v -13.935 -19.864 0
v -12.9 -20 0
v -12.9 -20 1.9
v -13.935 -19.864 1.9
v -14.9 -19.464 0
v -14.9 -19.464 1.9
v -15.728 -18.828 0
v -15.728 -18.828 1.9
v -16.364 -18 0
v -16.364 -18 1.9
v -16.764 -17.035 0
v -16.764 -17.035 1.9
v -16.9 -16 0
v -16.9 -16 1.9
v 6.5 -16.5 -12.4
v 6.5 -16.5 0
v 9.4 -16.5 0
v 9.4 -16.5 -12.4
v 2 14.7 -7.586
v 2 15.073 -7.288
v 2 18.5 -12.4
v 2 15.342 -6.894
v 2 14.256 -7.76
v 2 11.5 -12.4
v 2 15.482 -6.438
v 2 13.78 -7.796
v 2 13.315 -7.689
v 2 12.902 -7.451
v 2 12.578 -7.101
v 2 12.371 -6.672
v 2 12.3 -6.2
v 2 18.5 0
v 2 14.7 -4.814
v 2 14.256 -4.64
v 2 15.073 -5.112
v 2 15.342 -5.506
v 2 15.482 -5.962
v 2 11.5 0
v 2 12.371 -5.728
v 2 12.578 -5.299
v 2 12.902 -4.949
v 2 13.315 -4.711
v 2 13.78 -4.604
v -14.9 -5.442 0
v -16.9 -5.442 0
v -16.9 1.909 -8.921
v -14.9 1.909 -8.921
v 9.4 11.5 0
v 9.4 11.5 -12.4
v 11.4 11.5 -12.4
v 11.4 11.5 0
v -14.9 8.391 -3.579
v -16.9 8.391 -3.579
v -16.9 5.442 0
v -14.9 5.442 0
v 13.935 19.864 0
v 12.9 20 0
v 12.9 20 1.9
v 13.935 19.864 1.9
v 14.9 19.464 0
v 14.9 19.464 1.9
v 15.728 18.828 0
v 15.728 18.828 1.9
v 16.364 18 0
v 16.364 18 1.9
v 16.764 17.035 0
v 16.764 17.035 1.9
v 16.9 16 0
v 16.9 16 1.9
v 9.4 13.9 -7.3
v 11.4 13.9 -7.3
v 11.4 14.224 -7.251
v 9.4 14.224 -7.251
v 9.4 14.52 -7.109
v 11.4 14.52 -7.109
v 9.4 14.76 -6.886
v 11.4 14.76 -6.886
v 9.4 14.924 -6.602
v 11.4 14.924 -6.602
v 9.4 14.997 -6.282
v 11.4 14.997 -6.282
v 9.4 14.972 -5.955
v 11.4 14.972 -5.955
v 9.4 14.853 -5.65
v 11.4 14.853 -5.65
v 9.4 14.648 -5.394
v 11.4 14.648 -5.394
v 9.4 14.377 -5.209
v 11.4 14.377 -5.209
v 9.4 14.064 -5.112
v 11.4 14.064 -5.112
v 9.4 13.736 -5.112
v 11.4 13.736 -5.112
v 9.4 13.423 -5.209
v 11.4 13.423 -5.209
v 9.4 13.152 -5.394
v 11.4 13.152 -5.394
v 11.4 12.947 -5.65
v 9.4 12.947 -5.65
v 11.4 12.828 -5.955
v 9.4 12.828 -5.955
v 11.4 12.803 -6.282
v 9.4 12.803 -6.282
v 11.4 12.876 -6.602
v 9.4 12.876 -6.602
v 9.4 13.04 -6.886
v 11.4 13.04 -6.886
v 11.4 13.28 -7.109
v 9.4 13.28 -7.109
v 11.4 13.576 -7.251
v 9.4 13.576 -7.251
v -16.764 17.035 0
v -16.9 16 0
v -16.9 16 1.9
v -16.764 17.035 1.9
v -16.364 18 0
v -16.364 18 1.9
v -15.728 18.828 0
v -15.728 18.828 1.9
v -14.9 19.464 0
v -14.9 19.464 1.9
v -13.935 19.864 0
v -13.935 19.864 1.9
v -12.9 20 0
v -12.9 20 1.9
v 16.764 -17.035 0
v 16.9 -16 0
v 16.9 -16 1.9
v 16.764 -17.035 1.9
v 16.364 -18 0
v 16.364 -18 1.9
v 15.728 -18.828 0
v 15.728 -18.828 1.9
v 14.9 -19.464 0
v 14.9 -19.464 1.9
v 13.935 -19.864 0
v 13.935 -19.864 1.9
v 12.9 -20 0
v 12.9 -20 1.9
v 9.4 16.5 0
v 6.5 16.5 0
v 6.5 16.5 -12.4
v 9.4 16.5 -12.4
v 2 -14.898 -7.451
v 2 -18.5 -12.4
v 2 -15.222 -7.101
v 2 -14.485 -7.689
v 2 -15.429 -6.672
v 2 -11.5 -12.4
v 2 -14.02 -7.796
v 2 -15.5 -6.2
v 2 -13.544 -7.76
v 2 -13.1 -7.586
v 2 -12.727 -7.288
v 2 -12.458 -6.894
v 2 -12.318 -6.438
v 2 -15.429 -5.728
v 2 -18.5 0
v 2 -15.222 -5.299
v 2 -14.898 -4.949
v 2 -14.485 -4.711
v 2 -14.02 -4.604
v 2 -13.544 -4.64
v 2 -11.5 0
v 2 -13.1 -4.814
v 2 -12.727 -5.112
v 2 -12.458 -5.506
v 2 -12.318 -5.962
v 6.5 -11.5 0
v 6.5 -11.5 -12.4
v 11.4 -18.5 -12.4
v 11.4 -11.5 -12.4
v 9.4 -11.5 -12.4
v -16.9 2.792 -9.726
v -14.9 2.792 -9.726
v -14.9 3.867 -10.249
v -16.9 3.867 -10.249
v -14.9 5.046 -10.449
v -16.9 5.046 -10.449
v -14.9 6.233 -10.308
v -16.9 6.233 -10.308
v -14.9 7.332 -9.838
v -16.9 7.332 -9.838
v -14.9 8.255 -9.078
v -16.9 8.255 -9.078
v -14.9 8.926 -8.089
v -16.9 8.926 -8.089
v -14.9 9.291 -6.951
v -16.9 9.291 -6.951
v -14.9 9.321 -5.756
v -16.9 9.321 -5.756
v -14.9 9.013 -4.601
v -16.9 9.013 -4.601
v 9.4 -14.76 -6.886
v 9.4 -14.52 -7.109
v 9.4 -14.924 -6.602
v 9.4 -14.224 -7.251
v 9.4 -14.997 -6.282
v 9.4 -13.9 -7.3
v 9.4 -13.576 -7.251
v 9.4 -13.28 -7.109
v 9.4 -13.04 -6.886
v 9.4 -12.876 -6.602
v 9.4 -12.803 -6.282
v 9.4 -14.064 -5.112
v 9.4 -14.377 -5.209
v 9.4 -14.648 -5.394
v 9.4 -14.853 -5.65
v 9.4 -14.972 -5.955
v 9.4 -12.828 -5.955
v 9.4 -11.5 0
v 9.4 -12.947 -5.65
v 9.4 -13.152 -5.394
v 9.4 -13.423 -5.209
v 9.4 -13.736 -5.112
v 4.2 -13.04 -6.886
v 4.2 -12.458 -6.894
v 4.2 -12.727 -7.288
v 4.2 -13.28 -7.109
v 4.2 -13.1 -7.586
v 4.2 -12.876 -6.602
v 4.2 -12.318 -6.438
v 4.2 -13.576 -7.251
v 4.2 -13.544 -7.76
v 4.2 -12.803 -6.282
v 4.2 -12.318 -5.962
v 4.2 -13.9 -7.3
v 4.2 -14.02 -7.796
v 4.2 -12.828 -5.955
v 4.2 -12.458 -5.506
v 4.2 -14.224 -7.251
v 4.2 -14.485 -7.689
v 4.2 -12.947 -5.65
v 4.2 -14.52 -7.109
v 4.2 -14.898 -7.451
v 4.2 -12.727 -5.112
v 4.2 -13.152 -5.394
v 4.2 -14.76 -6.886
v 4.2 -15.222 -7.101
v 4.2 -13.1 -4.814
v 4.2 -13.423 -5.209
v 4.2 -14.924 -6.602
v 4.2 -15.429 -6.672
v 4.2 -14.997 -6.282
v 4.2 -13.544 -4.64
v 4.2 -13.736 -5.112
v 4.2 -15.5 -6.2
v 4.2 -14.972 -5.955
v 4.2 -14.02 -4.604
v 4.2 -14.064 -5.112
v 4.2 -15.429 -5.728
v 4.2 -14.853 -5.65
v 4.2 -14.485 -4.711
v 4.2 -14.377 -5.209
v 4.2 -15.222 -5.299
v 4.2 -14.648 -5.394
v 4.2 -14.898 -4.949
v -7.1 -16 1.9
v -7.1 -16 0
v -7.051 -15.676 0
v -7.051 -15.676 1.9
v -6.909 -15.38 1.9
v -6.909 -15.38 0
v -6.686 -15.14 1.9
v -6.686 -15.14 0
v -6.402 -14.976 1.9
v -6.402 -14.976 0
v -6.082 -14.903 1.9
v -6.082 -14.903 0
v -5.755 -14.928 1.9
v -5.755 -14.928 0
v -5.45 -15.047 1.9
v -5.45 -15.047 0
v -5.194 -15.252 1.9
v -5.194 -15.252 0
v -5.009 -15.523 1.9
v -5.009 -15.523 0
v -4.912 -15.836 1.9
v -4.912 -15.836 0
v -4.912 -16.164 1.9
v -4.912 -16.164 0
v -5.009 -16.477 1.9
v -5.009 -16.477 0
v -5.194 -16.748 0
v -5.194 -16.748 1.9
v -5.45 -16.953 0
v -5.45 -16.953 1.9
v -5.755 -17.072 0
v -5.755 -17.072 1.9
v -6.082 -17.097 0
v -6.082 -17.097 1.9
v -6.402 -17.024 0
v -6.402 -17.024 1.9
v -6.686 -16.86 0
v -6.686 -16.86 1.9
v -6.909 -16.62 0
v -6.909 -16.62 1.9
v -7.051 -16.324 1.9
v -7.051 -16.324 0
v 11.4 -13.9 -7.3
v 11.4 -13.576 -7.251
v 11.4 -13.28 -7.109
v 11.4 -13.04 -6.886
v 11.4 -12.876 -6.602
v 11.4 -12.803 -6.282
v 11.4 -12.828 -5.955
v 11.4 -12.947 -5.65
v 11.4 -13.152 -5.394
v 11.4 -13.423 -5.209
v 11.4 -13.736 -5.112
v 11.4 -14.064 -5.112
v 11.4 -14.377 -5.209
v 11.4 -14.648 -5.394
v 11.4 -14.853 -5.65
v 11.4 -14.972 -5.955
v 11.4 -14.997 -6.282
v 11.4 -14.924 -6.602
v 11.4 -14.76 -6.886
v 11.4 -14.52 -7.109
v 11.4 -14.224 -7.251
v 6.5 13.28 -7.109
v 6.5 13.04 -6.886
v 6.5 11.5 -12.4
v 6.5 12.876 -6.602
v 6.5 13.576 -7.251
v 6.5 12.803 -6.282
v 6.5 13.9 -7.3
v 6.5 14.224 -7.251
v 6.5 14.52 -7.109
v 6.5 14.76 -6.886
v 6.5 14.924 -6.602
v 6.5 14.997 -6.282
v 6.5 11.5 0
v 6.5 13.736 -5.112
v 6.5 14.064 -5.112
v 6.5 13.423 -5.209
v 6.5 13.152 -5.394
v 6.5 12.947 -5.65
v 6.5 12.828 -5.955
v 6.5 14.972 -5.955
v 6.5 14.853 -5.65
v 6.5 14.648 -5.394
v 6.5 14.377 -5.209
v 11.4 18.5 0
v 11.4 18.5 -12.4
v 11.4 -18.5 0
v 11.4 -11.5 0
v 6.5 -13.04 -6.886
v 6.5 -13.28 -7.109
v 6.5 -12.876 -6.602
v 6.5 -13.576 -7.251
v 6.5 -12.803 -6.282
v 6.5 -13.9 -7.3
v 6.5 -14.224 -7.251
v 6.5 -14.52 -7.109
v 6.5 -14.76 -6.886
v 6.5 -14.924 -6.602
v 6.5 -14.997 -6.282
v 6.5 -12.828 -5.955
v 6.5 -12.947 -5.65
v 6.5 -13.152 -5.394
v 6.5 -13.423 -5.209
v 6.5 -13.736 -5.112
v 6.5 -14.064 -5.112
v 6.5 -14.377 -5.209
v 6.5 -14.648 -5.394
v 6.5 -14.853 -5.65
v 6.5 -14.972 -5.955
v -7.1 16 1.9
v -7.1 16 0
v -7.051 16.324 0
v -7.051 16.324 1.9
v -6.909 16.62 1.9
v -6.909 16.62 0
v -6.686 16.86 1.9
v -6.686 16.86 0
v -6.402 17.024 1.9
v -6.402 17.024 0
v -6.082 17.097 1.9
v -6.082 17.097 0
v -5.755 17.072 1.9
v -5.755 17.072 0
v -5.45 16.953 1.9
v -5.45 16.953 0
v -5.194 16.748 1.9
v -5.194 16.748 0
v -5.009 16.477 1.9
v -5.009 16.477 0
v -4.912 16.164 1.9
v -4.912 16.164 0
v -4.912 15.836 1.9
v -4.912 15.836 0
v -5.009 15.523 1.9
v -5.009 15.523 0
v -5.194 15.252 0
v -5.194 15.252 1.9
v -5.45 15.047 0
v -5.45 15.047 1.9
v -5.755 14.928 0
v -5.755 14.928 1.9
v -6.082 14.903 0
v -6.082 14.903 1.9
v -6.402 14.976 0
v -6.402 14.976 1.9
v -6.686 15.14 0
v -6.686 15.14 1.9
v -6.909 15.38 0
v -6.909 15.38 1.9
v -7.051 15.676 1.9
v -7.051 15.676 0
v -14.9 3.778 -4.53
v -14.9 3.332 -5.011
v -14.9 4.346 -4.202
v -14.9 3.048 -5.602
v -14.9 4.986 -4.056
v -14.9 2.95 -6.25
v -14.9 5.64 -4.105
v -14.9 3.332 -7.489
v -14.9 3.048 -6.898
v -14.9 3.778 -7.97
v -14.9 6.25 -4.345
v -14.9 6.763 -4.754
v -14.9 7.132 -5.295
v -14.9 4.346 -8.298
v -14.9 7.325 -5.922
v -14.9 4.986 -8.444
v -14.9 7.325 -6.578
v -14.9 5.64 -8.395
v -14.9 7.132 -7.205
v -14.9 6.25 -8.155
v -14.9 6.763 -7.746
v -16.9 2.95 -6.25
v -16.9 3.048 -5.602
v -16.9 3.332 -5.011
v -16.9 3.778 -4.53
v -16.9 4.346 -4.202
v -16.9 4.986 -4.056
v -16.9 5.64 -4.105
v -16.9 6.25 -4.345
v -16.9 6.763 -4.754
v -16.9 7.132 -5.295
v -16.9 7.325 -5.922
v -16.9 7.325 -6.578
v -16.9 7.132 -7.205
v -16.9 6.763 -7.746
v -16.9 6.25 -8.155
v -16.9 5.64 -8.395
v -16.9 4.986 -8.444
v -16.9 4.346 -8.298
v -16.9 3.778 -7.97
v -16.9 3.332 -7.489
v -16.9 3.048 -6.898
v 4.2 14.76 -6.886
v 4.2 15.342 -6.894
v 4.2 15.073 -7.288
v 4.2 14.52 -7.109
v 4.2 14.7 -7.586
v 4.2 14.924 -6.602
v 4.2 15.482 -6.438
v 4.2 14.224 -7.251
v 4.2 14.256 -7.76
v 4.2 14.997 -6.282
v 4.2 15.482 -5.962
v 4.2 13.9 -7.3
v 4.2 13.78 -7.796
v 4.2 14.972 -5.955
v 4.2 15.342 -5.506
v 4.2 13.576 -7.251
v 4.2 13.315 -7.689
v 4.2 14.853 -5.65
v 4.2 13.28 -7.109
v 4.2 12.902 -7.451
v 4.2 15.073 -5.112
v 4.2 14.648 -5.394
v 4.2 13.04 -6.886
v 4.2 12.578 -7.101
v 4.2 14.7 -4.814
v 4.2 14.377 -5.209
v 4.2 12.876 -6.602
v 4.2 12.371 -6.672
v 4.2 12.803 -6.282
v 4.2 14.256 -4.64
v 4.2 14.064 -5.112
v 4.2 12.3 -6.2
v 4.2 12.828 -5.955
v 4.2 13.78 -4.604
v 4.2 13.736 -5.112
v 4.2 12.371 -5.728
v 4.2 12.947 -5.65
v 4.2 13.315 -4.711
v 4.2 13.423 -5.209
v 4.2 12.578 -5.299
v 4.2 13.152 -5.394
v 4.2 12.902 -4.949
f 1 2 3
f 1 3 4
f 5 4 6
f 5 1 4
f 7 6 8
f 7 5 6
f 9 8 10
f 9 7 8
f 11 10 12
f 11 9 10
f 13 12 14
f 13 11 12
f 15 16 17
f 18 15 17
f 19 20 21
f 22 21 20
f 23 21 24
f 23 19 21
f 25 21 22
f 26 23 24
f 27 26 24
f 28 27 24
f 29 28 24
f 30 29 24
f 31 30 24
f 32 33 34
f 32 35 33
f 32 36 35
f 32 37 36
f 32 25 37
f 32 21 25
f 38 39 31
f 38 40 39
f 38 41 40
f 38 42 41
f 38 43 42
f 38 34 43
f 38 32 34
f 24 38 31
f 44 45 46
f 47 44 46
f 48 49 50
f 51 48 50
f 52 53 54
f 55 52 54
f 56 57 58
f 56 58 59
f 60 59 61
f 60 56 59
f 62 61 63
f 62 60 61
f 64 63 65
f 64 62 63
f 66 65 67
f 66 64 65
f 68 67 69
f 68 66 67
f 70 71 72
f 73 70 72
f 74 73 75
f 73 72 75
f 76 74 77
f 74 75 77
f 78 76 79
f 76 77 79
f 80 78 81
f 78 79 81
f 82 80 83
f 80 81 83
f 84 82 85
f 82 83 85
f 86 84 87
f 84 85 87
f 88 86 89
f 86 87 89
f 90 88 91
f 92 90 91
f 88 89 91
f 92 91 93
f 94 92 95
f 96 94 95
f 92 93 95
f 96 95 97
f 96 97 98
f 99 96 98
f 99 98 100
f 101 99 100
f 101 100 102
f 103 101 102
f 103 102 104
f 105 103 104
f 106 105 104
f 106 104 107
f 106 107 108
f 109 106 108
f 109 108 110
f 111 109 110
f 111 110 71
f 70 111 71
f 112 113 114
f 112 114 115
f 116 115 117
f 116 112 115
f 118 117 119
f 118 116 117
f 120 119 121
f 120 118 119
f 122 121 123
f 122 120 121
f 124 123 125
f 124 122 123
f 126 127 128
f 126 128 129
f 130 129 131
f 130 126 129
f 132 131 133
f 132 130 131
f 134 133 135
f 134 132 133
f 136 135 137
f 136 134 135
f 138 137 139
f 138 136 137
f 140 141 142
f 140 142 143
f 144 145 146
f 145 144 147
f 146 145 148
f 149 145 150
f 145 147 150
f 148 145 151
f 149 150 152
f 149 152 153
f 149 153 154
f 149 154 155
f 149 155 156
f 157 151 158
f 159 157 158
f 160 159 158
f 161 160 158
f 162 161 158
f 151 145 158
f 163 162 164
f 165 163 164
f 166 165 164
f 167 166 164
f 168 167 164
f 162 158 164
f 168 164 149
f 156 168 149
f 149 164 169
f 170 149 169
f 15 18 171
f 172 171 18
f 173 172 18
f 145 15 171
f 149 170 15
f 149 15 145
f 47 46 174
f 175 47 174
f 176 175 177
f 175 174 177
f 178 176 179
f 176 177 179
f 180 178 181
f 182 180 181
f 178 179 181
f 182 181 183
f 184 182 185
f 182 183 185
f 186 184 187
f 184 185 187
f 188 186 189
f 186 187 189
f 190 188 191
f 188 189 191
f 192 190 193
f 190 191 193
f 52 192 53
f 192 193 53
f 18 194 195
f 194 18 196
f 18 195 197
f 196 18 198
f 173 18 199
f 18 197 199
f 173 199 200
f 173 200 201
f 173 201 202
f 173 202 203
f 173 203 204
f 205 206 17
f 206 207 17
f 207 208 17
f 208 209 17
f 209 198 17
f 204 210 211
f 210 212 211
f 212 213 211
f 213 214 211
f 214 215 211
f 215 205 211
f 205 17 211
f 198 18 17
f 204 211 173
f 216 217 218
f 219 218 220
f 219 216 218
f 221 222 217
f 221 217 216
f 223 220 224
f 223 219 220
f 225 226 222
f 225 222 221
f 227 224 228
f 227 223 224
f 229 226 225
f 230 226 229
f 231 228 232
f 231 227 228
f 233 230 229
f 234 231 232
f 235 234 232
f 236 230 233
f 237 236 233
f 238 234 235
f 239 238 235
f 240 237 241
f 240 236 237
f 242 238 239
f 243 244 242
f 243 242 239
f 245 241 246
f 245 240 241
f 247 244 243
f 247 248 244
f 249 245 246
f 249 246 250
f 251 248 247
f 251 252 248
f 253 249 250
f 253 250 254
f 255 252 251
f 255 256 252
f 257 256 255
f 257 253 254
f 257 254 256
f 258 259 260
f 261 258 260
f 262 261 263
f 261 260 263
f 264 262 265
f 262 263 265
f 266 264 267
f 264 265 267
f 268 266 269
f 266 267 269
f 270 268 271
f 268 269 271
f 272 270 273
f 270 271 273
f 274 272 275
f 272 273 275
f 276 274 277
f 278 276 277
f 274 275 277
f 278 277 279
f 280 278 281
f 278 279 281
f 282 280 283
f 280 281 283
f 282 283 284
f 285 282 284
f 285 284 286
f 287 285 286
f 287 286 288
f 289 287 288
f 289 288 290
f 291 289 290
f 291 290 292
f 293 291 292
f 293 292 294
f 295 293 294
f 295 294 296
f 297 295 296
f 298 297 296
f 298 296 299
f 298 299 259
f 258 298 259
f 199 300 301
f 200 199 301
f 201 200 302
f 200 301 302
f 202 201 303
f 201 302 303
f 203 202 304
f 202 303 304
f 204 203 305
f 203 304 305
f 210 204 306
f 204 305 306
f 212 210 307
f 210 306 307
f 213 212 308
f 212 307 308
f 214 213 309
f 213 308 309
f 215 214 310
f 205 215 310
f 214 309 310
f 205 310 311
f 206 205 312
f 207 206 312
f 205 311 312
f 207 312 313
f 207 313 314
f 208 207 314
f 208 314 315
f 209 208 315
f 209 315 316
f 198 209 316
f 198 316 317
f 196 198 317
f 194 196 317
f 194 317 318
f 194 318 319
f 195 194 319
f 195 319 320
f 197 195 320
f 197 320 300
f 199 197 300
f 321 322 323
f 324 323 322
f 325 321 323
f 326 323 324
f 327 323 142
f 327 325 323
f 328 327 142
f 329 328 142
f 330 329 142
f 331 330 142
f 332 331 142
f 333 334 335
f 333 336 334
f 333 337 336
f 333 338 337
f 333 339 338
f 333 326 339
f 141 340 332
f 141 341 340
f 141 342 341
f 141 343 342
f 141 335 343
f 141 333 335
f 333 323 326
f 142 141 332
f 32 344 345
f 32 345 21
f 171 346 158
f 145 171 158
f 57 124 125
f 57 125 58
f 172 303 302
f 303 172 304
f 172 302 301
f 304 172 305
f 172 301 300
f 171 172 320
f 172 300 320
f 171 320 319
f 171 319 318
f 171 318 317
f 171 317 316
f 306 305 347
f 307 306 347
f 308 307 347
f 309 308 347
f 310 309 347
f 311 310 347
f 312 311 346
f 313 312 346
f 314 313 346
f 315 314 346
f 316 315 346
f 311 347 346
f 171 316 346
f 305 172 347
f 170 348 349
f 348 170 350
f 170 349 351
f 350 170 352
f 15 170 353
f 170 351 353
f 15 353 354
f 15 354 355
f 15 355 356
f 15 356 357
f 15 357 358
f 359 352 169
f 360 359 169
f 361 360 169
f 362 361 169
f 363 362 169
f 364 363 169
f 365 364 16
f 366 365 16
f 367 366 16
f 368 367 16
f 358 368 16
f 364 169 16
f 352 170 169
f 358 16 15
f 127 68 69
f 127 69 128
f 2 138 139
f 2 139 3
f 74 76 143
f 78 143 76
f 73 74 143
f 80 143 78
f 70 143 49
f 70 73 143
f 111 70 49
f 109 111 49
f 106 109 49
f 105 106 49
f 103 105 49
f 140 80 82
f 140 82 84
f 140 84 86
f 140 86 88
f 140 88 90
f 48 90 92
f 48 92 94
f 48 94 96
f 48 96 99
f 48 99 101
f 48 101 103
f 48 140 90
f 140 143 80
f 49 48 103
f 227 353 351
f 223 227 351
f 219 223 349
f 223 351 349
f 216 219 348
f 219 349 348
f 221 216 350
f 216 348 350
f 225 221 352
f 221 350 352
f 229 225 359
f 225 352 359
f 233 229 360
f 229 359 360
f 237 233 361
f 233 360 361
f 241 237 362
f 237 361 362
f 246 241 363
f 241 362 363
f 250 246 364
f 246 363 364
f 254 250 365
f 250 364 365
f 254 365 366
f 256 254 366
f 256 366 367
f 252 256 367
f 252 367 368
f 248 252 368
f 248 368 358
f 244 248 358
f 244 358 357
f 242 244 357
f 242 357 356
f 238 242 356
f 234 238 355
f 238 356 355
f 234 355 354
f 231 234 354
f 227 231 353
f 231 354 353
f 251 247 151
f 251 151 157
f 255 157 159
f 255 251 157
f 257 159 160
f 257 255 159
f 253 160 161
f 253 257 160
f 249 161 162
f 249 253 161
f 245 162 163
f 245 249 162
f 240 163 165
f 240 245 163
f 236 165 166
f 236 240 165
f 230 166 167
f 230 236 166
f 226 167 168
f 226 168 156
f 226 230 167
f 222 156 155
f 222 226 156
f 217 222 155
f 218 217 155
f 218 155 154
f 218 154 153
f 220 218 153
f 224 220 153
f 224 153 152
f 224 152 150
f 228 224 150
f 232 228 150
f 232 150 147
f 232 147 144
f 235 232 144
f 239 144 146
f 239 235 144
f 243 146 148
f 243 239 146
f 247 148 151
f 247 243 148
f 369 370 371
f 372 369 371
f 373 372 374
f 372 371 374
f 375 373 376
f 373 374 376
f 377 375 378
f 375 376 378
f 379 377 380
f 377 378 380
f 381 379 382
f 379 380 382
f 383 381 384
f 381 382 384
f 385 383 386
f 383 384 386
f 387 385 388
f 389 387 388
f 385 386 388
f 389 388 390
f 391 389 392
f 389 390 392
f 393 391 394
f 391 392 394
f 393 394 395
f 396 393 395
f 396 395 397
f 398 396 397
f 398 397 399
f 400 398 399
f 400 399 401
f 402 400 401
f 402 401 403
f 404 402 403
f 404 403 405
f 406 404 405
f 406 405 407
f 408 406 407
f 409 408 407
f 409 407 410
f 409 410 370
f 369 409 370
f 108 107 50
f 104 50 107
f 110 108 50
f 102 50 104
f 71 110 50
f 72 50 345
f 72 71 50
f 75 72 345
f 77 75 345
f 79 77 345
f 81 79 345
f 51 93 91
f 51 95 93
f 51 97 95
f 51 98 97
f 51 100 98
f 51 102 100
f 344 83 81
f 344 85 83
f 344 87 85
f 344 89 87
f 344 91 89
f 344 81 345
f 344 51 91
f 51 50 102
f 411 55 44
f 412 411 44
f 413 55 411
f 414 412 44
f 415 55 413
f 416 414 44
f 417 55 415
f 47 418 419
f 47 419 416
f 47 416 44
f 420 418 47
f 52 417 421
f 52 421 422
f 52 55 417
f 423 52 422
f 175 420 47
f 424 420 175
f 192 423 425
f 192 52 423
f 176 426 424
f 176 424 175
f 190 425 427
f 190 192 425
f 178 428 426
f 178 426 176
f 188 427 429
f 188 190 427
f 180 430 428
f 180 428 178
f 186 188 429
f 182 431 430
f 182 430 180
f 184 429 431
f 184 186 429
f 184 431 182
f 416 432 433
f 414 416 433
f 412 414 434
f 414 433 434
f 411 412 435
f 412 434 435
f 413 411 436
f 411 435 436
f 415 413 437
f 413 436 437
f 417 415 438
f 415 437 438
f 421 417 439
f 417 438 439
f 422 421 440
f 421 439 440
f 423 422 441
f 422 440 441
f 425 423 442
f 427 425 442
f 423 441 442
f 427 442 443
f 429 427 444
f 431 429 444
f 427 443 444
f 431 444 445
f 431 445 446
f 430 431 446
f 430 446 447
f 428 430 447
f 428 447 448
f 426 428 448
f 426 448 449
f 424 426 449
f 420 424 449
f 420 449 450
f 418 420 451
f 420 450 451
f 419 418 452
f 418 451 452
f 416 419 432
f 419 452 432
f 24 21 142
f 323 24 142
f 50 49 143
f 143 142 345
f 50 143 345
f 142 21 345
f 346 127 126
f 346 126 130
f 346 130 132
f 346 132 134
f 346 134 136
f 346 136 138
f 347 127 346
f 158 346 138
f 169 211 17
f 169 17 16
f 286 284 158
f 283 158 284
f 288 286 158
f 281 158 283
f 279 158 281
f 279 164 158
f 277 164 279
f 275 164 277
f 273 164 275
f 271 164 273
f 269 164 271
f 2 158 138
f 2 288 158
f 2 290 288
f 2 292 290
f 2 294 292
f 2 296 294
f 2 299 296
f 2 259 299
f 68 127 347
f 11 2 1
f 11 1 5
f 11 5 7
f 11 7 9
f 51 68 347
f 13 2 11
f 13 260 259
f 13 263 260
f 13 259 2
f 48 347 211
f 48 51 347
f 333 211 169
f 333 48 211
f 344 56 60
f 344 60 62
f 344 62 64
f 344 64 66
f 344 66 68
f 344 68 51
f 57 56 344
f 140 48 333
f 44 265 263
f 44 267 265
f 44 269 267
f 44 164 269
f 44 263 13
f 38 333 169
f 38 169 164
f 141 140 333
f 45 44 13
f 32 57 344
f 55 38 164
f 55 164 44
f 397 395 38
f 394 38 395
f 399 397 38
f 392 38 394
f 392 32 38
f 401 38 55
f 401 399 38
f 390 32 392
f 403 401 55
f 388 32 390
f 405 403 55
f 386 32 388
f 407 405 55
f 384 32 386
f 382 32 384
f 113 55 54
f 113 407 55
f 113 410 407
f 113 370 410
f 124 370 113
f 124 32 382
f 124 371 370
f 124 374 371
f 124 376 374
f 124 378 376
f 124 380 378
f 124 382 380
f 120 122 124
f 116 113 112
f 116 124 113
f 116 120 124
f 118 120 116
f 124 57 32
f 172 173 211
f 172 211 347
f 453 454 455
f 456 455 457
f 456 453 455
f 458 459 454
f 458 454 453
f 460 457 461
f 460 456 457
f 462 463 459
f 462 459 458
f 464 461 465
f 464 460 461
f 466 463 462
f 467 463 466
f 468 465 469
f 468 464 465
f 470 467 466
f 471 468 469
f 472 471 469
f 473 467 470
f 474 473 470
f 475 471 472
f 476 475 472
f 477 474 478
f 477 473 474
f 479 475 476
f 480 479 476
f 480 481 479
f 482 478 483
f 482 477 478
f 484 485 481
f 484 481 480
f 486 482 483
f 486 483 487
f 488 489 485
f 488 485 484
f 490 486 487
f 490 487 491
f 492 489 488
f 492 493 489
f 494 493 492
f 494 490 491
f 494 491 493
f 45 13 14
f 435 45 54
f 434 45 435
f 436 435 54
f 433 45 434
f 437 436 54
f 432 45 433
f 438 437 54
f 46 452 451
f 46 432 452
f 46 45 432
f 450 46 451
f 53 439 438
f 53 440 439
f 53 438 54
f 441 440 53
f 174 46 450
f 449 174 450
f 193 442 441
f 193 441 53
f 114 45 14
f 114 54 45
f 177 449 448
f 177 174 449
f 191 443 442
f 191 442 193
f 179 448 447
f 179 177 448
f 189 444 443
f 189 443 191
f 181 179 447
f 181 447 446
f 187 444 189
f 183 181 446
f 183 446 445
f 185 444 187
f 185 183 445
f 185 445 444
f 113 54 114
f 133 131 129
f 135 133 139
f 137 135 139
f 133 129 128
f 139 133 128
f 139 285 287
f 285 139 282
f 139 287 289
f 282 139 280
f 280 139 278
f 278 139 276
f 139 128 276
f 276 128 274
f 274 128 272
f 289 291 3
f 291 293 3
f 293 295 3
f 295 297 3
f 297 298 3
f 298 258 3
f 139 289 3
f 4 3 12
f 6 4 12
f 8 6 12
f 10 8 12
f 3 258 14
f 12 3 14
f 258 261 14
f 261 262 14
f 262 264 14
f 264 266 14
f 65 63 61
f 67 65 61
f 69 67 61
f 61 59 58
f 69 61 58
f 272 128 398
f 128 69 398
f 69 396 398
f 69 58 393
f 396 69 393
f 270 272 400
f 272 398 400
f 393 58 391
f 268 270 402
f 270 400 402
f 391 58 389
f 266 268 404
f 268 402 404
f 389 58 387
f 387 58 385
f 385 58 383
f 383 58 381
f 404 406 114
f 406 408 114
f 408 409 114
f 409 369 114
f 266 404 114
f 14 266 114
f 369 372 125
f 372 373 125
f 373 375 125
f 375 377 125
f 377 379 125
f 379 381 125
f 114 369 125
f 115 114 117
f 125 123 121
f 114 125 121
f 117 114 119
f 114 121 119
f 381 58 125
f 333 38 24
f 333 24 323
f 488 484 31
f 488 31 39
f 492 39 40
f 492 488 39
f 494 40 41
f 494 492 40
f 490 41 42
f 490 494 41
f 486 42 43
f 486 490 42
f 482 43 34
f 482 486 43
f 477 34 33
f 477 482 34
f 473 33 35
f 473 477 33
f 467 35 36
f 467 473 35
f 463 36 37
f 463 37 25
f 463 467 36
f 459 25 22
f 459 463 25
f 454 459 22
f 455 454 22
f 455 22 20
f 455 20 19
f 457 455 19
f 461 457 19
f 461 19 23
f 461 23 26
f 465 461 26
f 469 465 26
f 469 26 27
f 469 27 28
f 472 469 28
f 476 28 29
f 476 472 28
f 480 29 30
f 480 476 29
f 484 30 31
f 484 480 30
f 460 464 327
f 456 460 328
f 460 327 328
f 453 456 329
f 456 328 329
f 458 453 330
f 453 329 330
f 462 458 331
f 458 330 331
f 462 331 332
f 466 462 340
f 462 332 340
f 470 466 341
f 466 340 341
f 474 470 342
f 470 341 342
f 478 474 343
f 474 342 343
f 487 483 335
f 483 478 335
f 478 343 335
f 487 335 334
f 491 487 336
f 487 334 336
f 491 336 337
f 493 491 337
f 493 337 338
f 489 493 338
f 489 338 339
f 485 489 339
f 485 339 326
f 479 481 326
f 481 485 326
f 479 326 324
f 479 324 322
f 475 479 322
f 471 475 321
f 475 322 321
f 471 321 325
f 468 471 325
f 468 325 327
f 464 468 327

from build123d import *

# Parameters (mm, degrees)
DODANIE_WYCI_GNI_CIE1_DEPTH = 1.9
DODANIE_WYCI_GNI_CIE3_DEPTH = 12.4
ESQUISSE4_R                 = 2.2
BOSS_EXTRU_2_DEPTH          = 2
ESQUISSE5_R                 = 1.1
ENL_V_MAT_EXTRU_2_DEPTH     = 29.971882921
ENL_V_MAT_EXTRU_4_REACH     = 38.806
ESQUISSE6_R                 = 1.1
ENL_V_START                 = -2.2
ESQUISSE7_R                 = 1.6
ESQUISSE7_R_2               = 1.1
ENL_V_MAT_EXTRU_5_DEPTH     = 2.2


with BuildPart() as part:
    # Szkic1 → Dodanie-wyciągnięcie1 (new body)
    with BuildSketch(Plane.XY):
        with BuildLine():
            Line((-12.9, 20), (12.9, 20))
            ThreePointArc((12.9, 20), (15.728427125, 18.828427125), (16.9, 16))
            Line((16.9, 16), (16.9, -16))
            ThreePointArc((16.9, -16), (15.728427125, -18.828427125), (12.9, -20))
            Line((12.9, -20), (-12.9, -20))
            ThreePointArc((-12.9, -20), (-15.728427125, -18.828427125), (-16.9, -16))
            Line((-16.9, -16), (-16.9, 16))
            ThreePointArc((-16.9, 16), (-15.728427125, 18.828427125), (-12.9, 20))
        make_face()
    extrude(amount=DODANIE_WYCI_GNI_CIE1_DEPTH)

    # Szkic3 → Dodanie-wyciągnięcie3 (add)
    with BuildSketch(Plane(origin=(0, 0, 0), x_dir=(-1, 0, 0), z_dir=(0, 0, -1))):
        Polygon((-9.4, -16.5), (-9.4, -11.5), (-11.4, -11.5), (-11.4, -18.5), (-2, -18.5), (-2, -11.5), (-6.5, -11.5), (-6.5, -16.5), align=None)
        Polygon((-9.4, 11.5), (-11.4, 11.5), (-11.4, 18.5), (-2, 18.5), (-2, 11.5), (-6.5, 11.5), (-6.5, 16.5), (-9.4, 16.5), align=None)
    extrude(amount=DODANIE_WYCI_GNI_CIE3_DEPTH)

    # Esquisse4 → Boss.-Extru.2 (add)
    with BuildSketch(Plane.ZY.offset(16.9)):
        with BuildLine():
            Line((-3.579120726, 8.391358342), (0, 5.442162864))
            Line((0, 5.442162864), (0, -5.442162864))
            Line((0, -5.442162864), (-8.920879274, 1.908641658))
            ThreePointArc((-8.920879274, 1.908641658), (-9.491358342, 7.820879274), (-3.579120726, 8.391358342))
        make_face()
        with Locations(Location((-6.25, 5.15, 0), (0, 0, 270))):
            Circle(ESQUISSE4_R, mode=Mode.SUBTRACT)
    extrude(amount=-BOSS_EXTRU_2_DEPTH)

    # Esquisse5 → Enlèv. mat.-Extru.2 (cut, through all)
    with BuildSketch(Plane(origin=(0, 0, 0), x_dir=(-1, 0, 0), z_dir=(0, 0, -1))):
        with Locations((6, 16)):
            Circle(ESQUISSE5_R)
        with Locations((6, -16)):
            Circle(ESQUISSE5_R)
    extrude(amount=-ENL_V_MAT_EXTRU_2_DEPTH, mode=Mode.SUBTRACT)

    # Enlèv. mat.-Extru.4: up to this face of the body (flat: up to its plane)
    enl_v_mat_extru_4_end = Plane(part.part.faces().sort_by_distance((2, 15, -6.2))[0])
    # Esquisse6 → Enlèv. mat.-Extru.4 (cut, up to the picked face)
    with BuildSketch(Plane(origin=(11.4, 0, 0), x_dir=(0, 0, -1), z_dir=(1, 0, 0)), mode=Mode.PRIVATE) as enl_v_mat_extru_4_sk1:
        with Locations((6.2, 13.9)):
            Circle(ESQUISSE6_R)
    enl_v_mat_extru_4_tool1 = split(extrude(enl_v_mat_extru_4_sk1.sketch, amount=-ENL_V_MAT_EXTRU_4_REACH, mode=Mode.PRIVATE), bisect_by=enl_v_mat_extru_4_end, keep=Keep.BOTH, mode=Mode.PRIVATE)
    # Esquisse6 → Enlèv. mat.-Extru.4 (cut, up to the picked face)
    with BuildSketch(Plane(origin=(11.4, 0, 0), x_dir=(0, 0, -1), z_dir=(1, 0, 0)), mode=Mode.PRIVATE) as enl_v_mat_extru_4_sk2:
        with Locations((6.2, -13.9)):
            Circle(ESQUISSE6_R)
    enl_v_mat_extru_4_tool2 = split(extrude(enl_v_mat_extru_4_sk2.sketch, amount=-ENL_V_MAT_EXTRU_4_REACH, mode=Mode.PRIVATE), bisect_by=enl_v_mat_extru_4_end, keep=Keep.BOTH, mode=Mode.PRIVATE)
    add(enl_v_mat_extru_4_tool1.solids().sort_by(Axis((11.4, 13.9, -6.2), (-1, 0, 0)))[0], mode=Mode.SUBTRACT)
    add(enl_v_mat_extru_4_tool2.solids().sort_by(Axis((11.4, -13.9, -6.2), (-1, 0, 0)))[0], mode=Mode.SUBTRACT)

    # Esquisse7 → Enlèv. mat.-Extru.5 (cut)
    # profile 1 of 4: a face of its own
    with BuildSketch(Plane.ZY.offset(-2).offset(ENL_V_START)):
        with Locations(Location((-6.2, 13.9, 0), (0, 0, 270))):
            Circle(ESQUISSE7_R)
        with Locations(Location((-6.2, 13.9, 0), (0, 0, 180))):
            Circle(ESQUISSE7_R_2, mode=Mode.SUBTRACT)
    # profile 2 of 4: a face of its own
    with BuildSketch(Plane.ZY.offset(-2).offset(ENL_V_START)):
        with Locations(Location((-6.2, 13.9, 0), (0, 0, 180))):
            Circle(ESQUISSE7_R_2)
    # profile 3 of 4: a face of its own
    with BuildSketch(Plane.ZY.offset(-2).offset(ENL_V_START)):
        with Locations(Location((-6.2, -13.9, 0), (0, 0, 270))):
            Circle(ESQUISSE7_R)
        with Locations(Location((-6.2, -13.9, 0), (0, 0, 270))):
            Circle(ESQUISSE7_R_2, mode=Mode.SUBTRACT)
    # profile 4 of 4: a face of its own
    with BuildSketch(Plane.ZY.offset(-2).offset(ENL_V_START)):
        with Locations(Location((-6.2, -13.9, 0), (0, 0, 270))):
            Circle(ESQUISSE7_R_2)
    extrude(amount=ENL_V_MAT_EXTRU_5_DEPTH, mode=Mode.SUBTRACT)


solid = part.part
